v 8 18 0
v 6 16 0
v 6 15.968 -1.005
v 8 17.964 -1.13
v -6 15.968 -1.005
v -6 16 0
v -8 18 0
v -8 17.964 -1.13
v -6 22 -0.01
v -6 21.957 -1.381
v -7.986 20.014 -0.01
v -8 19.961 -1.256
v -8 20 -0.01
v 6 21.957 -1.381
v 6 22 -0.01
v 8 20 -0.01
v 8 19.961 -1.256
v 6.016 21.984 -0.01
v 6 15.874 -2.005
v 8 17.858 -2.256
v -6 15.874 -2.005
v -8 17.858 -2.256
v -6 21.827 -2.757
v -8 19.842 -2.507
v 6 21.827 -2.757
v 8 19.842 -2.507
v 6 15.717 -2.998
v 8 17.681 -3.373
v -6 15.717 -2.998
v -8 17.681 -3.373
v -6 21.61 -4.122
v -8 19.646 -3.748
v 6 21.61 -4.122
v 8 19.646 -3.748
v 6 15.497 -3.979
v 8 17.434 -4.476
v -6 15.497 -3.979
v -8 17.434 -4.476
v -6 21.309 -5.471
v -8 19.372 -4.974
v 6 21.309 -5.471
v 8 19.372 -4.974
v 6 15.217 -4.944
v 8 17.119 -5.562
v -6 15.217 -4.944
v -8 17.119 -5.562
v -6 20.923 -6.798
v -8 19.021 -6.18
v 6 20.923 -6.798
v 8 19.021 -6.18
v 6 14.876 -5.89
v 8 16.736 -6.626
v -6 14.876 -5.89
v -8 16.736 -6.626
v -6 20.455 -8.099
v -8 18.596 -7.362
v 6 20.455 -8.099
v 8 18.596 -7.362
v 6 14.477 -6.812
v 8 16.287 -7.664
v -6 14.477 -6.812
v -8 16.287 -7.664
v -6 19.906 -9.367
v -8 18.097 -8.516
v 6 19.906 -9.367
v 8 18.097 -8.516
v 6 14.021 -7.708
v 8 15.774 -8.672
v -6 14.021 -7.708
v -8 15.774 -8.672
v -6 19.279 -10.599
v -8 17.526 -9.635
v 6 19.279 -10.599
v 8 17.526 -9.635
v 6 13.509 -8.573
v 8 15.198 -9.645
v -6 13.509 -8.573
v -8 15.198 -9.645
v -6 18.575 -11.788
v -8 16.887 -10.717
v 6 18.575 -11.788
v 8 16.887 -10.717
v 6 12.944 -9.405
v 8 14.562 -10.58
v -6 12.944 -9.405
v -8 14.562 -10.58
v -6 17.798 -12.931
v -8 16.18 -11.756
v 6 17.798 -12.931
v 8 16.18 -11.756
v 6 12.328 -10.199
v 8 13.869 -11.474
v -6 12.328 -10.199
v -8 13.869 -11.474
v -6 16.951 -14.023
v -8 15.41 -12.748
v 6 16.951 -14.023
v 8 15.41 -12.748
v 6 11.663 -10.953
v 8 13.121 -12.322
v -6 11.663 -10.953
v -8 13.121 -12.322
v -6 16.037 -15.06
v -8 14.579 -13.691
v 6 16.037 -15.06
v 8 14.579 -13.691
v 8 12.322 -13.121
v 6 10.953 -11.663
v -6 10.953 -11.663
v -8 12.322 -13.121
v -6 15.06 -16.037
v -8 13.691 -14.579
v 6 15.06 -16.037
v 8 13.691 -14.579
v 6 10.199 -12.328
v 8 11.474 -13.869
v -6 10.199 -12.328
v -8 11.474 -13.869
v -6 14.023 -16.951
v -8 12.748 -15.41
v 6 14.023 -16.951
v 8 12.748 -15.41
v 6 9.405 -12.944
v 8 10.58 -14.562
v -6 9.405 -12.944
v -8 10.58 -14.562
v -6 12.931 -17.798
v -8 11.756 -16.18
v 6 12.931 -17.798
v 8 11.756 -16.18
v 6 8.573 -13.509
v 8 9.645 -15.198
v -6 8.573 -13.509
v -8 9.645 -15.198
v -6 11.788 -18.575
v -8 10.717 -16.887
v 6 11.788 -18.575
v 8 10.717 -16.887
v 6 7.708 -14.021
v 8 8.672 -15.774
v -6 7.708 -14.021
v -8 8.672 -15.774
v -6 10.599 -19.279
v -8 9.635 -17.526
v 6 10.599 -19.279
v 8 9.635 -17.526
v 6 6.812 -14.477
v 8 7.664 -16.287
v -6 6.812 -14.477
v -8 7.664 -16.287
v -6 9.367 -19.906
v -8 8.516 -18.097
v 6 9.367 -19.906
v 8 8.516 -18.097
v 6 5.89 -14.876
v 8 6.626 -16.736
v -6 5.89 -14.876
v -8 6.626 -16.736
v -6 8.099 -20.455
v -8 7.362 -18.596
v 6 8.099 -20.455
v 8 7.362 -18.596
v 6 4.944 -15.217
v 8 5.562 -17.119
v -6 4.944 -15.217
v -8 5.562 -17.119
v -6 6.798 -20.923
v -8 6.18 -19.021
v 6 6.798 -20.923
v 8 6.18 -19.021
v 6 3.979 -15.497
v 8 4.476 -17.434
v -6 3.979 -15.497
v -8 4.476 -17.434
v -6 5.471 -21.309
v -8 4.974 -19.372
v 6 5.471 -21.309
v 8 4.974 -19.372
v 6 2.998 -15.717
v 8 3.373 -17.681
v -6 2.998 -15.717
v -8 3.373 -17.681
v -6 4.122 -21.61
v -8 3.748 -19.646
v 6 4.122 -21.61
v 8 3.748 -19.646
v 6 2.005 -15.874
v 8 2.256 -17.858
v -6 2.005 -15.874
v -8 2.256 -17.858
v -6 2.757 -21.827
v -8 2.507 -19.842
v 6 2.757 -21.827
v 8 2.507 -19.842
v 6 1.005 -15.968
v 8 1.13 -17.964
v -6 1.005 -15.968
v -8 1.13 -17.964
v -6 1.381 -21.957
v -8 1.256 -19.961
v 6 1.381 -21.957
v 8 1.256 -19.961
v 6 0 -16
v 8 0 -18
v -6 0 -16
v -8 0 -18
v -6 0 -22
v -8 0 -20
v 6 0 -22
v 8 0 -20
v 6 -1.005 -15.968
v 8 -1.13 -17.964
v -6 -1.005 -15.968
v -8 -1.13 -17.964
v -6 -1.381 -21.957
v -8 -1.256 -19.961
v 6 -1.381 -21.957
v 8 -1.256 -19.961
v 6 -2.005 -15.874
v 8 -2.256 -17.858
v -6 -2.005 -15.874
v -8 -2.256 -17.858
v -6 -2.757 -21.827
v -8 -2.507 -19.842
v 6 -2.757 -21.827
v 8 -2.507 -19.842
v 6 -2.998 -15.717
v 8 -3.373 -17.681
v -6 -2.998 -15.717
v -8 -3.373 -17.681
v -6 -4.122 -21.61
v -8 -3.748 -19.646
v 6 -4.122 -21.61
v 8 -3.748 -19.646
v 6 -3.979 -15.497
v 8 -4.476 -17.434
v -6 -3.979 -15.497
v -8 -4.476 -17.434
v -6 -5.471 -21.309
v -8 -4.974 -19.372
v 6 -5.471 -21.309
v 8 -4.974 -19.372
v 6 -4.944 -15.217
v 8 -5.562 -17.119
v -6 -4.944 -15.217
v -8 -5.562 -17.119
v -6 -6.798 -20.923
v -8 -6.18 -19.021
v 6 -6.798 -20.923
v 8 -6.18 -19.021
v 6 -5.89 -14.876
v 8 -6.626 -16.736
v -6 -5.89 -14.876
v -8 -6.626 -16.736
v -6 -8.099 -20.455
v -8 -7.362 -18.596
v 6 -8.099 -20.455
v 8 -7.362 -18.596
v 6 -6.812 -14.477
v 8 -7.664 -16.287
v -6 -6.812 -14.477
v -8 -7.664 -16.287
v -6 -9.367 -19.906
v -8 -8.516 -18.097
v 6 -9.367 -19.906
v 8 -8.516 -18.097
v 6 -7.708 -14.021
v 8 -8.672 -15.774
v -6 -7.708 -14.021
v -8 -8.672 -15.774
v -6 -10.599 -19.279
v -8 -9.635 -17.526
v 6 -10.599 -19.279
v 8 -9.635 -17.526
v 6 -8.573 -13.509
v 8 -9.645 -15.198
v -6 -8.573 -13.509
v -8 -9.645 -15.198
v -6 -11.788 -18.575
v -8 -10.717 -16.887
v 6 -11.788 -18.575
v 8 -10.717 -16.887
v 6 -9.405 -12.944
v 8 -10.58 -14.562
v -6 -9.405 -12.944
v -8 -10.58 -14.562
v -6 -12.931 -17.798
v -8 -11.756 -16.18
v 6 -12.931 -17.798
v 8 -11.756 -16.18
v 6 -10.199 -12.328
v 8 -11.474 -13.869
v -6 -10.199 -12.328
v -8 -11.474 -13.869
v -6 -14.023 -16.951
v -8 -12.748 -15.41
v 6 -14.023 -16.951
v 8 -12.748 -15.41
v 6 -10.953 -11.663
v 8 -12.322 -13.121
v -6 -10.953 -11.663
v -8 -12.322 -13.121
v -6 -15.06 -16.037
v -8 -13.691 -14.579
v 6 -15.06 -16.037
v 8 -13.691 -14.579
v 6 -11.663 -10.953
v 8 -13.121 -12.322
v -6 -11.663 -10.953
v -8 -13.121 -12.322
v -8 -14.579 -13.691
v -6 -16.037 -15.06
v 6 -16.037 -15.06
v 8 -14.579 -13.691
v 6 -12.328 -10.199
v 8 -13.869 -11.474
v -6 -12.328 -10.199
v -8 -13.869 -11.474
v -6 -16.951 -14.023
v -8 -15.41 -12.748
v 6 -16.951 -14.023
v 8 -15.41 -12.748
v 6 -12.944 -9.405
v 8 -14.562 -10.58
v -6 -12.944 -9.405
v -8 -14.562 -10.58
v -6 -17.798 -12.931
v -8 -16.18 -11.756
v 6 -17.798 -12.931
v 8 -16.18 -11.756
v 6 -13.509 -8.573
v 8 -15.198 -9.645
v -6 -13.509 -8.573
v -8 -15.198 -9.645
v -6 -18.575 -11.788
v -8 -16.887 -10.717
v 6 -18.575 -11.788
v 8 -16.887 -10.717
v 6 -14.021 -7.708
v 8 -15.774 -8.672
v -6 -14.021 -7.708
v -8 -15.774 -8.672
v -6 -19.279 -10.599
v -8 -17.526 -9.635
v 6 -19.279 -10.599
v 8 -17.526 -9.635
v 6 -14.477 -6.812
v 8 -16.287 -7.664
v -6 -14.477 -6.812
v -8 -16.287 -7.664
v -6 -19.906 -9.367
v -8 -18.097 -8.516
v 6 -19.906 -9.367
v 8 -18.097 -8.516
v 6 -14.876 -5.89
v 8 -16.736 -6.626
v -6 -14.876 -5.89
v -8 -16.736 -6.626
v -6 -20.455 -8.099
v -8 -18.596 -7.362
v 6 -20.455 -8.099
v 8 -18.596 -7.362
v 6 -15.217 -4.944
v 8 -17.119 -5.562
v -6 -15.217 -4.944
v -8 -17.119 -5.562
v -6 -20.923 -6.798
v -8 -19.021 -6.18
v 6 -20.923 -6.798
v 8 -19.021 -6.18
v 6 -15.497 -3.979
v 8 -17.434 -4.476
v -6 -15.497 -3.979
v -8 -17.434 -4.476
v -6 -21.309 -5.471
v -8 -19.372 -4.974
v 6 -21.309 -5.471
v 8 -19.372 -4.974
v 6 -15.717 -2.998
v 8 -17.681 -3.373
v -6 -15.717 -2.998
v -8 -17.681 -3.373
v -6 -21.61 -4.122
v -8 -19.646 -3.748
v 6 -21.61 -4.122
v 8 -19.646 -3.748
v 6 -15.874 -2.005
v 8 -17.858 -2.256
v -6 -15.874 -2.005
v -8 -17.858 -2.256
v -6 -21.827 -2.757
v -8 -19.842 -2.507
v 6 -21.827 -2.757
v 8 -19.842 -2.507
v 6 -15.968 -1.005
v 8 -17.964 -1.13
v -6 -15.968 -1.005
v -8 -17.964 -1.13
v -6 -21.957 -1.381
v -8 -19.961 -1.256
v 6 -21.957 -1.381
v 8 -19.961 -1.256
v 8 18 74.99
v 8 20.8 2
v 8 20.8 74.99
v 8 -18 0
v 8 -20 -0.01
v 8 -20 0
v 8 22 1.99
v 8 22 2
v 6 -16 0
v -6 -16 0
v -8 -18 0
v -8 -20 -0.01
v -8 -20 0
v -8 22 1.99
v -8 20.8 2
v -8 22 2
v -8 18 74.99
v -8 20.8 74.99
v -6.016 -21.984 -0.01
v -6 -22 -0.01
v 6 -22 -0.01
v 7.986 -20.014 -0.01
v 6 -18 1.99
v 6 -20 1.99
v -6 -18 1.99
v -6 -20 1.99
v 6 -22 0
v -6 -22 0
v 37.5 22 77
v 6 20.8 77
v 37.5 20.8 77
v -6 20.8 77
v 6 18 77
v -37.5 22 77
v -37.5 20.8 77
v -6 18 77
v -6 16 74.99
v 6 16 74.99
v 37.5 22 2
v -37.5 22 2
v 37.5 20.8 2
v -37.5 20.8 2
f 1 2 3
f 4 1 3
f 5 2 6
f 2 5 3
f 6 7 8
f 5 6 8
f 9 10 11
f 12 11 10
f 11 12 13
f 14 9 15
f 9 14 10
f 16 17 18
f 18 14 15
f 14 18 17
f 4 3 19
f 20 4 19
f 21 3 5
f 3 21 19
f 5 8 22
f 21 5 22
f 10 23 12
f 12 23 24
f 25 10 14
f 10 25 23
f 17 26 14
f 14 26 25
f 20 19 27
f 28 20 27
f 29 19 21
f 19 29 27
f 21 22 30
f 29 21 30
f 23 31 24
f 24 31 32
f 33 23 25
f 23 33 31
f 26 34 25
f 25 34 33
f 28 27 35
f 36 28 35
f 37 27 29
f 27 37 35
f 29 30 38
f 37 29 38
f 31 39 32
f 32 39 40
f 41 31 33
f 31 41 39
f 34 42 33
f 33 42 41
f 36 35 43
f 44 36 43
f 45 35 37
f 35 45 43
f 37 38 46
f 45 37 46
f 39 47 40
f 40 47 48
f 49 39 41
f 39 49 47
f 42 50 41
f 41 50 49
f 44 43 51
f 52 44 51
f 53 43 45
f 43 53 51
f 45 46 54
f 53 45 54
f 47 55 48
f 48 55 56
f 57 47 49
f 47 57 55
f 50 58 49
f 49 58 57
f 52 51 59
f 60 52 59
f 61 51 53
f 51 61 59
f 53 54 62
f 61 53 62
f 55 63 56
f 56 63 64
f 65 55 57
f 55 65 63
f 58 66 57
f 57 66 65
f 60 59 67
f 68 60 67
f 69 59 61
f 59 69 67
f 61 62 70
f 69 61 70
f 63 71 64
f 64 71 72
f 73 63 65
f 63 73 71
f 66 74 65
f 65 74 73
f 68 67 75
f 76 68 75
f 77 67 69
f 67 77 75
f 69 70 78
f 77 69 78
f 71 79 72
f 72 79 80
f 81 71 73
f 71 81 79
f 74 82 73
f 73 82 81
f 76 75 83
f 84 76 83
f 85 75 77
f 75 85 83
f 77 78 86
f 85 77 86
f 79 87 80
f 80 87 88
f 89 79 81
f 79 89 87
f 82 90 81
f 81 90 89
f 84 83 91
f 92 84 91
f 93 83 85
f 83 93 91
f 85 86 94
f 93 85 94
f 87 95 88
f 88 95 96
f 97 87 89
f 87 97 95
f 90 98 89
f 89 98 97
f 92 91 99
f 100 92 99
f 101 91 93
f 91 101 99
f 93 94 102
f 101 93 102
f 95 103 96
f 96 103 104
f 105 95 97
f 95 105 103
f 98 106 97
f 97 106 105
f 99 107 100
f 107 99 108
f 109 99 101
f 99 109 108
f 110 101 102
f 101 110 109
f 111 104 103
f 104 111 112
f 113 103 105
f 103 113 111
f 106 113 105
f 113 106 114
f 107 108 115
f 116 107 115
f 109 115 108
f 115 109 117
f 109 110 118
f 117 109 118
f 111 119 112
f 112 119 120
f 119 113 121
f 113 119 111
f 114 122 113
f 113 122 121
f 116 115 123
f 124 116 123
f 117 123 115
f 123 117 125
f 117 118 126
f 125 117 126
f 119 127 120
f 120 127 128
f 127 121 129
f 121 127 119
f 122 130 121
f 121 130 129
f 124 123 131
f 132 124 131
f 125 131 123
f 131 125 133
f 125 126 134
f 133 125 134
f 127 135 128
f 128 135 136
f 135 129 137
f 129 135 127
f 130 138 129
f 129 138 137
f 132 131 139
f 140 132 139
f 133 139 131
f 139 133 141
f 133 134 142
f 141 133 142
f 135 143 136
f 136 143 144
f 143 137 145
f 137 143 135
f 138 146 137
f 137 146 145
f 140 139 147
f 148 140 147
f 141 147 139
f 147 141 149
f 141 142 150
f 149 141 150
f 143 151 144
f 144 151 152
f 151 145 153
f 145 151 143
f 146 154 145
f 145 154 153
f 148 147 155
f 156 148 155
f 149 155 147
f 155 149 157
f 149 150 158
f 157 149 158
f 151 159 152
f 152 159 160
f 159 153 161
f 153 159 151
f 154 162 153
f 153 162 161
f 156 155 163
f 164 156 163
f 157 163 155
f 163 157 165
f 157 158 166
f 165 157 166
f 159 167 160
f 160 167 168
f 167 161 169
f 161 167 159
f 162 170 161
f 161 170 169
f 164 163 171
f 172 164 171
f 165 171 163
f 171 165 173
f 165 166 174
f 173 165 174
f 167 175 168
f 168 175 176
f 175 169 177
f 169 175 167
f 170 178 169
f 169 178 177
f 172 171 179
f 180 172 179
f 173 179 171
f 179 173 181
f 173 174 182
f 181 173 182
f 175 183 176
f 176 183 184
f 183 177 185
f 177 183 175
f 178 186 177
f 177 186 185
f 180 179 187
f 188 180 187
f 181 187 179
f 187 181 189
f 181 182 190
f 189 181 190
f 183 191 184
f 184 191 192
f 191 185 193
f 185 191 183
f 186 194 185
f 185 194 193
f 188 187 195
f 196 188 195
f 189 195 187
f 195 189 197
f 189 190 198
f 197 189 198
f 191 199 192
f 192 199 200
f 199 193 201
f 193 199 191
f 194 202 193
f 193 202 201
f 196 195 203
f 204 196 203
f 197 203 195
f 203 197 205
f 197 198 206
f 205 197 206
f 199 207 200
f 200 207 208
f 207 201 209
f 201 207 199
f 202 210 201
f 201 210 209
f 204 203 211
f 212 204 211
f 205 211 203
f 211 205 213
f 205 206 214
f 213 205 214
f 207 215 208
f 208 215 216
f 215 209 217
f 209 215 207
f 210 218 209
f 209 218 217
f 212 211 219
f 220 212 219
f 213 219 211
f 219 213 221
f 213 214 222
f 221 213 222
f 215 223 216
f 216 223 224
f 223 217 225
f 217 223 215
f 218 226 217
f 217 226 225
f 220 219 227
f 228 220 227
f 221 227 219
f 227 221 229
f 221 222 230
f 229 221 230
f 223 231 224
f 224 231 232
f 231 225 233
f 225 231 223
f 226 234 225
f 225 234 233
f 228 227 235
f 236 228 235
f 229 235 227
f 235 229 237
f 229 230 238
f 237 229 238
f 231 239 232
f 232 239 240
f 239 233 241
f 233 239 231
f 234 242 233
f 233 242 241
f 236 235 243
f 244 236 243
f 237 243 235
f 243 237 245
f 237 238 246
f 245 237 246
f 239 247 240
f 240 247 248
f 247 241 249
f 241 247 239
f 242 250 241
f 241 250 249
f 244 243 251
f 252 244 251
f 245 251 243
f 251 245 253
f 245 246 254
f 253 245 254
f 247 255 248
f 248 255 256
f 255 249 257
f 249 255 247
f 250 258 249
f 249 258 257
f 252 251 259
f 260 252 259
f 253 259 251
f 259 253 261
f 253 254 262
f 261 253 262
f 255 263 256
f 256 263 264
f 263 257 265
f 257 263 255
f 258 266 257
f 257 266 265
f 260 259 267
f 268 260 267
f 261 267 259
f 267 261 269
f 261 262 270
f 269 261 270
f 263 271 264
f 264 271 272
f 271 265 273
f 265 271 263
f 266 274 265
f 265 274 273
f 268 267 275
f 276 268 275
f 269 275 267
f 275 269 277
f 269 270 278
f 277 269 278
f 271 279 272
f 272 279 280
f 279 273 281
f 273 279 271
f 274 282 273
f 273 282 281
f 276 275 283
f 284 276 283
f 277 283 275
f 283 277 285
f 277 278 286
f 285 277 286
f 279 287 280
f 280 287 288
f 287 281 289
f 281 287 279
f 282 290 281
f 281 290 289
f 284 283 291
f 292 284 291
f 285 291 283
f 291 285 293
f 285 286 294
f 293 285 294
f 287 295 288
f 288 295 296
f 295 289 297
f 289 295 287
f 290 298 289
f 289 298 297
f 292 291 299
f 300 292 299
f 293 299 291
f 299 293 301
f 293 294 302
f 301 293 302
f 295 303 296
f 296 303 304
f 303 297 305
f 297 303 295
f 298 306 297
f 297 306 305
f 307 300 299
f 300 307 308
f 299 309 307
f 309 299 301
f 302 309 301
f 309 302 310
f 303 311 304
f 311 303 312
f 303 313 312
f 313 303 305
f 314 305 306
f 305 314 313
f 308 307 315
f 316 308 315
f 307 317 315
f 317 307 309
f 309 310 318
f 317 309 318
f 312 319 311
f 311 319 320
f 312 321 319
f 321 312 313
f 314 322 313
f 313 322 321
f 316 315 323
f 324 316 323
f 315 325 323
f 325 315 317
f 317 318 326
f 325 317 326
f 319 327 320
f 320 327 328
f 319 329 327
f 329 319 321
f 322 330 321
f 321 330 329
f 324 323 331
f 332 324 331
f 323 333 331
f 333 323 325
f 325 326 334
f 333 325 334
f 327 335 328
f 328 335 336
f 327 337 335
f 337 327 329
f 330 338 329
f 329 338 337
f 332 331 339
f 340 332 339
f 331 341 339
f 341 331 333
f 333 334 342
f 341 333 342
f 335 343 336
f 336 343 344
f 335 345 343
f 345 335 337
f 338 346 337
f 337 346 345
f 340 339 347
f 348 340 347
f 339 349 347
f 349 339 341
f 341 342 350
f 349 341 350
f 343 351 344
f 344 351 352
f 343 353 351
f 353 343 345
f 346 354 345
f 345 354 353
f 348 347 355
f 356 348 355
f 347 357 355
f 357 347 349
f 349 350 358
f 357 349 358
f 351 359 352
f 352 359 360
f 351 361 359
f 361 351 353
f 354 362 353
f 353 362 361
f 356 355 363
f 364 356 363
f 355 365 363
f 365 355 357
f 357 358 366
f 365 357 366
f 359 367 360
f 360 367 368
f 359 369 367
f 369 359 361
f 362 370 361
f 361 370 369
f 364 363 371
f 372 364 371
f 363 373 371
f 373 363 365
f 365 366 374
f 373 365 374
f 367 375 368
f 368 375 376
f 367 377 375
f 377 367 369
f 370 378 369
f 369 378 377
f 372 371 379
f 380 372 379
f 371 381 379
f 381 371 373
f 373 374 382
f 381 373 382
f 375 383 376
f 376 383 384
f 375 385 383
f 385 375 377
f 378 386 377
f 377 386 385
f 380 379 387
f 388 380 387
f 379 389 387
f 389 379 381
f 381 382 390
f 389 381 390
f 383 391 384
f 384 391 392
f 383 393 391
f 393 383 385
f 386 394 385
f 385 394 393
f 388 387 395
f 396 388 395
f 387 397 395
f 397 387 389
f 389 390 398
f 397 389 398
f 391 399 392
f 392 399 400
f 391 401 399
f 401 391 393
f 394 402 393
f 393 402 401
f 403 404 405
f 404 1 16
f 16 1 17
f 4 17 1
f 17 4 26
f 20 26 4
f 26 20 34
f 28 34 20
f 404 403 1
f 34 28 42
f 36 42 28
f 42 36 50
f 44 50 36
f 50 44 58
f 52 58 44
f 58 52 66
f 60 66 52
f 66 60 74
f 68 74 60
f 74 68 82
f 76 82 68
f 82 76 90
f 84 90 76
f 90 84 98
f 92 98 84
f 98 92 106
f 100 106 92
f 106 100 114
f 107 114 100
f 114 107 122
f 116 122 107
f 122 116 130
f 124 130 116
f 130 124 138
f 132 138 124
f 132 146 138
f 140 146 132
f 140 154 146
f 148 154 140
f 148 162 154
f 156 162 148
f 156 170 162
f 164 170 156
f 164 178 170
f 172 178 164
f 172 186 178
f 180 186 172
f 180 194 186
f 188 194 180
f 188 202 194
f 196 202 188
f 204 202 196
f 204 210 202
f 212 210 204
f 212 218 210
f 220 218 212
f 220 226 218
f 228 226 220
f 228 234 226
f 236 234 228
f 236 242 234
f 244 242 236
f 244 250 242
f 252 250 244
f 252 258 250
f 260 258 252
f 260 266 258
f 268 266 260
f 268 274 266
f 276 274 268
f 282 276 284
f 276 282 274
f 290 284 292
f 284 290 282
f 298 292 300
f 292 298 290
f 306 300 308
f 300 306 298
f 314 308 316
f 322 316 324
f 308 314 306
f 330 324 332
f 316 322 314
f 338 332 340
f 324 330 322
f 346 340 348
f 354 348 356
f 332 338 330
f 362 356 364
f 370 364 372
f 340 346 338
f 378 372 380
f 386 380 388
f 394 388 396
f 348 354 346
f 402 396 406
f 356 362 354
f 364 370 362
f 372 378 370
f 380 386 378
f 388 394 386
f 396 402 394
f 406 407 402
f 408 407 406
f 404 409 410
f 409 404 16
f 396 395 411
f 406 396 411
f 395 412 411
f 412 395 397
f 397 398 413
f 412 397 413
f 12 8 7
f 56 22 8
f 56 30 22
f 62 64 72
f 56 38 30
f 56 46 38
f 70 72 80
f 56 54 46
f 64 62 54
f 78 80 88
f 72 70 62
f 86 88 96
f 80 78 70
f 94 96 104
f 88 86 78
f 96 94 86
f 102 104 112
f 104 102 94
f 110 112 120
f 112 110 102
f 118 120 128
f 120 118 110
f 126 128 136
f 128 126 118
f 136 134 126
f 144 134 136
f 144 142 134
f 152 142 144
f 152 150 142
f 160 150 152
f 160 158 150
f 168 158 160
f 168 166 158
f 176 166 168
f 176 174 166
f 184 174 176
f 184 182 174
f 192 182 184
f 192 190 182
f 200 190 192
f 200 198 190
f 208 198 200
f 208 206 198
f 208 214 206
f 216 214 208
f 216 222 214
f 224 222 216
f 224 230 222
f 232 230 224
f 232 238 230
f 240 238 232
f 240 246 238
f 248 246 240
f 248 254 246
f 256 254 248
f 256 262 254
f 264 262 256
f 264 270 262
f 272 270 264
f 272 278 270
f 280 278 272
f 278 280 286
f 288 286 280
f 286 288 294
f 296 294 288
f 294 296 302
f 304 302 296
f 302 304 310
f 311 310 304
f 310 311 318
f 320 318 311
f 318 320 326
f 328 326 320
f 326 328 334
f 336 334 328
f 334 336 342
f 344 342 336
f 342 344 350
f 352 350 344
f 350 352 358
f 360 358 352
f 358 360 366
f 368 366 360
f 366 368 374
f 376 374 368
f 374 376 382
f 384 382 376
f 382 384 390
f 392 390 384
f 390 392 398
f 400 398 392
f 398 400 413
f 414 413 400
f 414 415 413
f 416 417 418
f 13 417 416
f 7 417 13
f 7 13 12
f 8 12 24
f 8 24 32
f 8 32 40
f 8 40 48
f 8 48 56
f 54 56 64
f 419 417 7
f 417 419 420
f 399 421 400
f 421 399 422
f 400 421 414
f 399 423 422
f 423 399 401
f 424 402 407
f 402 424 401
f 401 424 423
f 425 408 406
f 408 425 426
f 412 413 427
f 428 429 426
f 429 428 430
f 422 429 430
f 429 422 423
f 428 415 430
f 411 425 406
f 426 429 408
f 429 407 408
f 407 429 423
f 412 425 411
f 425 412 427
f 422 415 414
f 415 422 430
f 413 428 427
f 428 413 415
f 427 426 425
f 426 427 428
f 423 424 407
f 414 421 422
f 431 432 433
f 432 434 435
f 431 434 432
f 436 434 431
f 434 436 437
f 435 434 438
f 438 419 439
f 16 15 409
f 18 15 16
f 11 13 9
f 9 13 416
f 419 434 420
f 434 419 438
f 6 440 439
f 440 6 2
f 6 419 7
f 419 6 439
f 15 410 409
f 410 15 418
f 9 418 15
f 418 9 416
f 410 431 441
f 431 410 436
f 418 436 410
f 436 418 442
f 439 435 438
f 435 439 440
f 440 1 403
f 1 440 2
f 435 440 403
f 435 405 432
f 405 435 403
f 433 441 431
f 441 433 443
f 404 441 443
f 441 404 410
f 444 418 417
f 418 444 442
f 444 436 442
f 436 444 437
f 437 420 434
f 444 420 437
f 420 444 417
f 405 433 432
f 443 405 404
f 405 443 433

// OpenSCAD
// Inner radius
bend_radius = 16; // [.2:60]

// Hook width
width = 16; // [4:150]

// Hook thickness
thickness = 6; // [4:20]

// Backing plate width
plate_width = 75; // [4:150]

// Backing plate height
plate_height = 75; // [4:150]

// Backing plate thickness
plate_thickness = 1.2; // [0.2:10]

/* [Hidden] */
vwidth = max([width,thickness]);
$fn = 100;

/* rotate_extrude angle workaround by thehans.
 * http://forum.openscad.org/rotate-extrude-angle-always-360-tp19035p19040.html
 */
module rotate_extrude2(angle=360, convexity=2, size=1000) {

  module angle_cut(angle=90,size=1000) {
    x = size*cos(angle/2);
    y = size*sin(angle/2);
    translate([0,0,-size]) 
      linear_extrude(2*size) polygon([[0,0],[x,y],[x,size],[-size,size],[-size,-size],[x,-size],[x,-y]]);
  }

  // support for angle parameter in rotate_extrude was added after release 2015.03 
  // Thingiverse customizer is still on 2015.03
  angleSupport = (version_num() > 20150399) ? true : false; // Next openscad releases after 2015.03.xx will have support angle parameter
  // Using angle parameter when possible provides huge speed boost, avoids a difference operation

  if (angleSupport) {
    rotate_extrude(angle=angle,convexity=convexity)
      children();
  } else {
    rotate([0,0,angle/2]) difference() {
      rotate_extrude(convexity=convexity) children();
      angle_cut(angle, size);
    }
  }
}

module poly()
{
    polygon([[thickness/3,0], [2*thickness/3,0], [thickness,thickness/3],
        [thickness,vwidth-thickness/3], [2*thickness/3,vwidth],
        [thickness/3,vwidth], [0,vwidth-thickness/3], [0,thickness/3]]);
}

union()
{
    translate([vwidth/2,0,0]) rotate([-90,0,90]) rotate_extrude2(angle=180)
        translate([bend_radius,0]) poly();

    translate([vwidth/2,-bend_radius-thickness,-.01]) rotate([0,0,90]) hull()
    {
        linear_extrude(.01) poly();
        translate([0,0,thickness/3-.01]) linear_extrude(.01)
            translate([thickness/3,thickness/3])
            square([thickness/3,vwidth-2*thickness/3]);
    }

    translate([vwidth/2,bend_radius,-.01]) rotate([0,0,90]) hull()
    {
        linear_extrude(.01) poly();
        translate([0,0,thickness/3])
            linear_extrude(plate_height-thickness/3) union()
            {
                poly();
                translate([thickness/2,0]) square([thickness/2,vwidth]);
            }
        translate([0,0,plate_height+thickness/3]) linear_extrude(.01)
            translate([thickness/3,thickness/3])
            square([2*thickness/3,vwidth-2*thickness/3]);
    }

    translate([-plate_width/2,bend_radius+thickness-plate_thickness,
            thickness/3])
        cube([plate_width,plate_thickness,plate_height]);
}
